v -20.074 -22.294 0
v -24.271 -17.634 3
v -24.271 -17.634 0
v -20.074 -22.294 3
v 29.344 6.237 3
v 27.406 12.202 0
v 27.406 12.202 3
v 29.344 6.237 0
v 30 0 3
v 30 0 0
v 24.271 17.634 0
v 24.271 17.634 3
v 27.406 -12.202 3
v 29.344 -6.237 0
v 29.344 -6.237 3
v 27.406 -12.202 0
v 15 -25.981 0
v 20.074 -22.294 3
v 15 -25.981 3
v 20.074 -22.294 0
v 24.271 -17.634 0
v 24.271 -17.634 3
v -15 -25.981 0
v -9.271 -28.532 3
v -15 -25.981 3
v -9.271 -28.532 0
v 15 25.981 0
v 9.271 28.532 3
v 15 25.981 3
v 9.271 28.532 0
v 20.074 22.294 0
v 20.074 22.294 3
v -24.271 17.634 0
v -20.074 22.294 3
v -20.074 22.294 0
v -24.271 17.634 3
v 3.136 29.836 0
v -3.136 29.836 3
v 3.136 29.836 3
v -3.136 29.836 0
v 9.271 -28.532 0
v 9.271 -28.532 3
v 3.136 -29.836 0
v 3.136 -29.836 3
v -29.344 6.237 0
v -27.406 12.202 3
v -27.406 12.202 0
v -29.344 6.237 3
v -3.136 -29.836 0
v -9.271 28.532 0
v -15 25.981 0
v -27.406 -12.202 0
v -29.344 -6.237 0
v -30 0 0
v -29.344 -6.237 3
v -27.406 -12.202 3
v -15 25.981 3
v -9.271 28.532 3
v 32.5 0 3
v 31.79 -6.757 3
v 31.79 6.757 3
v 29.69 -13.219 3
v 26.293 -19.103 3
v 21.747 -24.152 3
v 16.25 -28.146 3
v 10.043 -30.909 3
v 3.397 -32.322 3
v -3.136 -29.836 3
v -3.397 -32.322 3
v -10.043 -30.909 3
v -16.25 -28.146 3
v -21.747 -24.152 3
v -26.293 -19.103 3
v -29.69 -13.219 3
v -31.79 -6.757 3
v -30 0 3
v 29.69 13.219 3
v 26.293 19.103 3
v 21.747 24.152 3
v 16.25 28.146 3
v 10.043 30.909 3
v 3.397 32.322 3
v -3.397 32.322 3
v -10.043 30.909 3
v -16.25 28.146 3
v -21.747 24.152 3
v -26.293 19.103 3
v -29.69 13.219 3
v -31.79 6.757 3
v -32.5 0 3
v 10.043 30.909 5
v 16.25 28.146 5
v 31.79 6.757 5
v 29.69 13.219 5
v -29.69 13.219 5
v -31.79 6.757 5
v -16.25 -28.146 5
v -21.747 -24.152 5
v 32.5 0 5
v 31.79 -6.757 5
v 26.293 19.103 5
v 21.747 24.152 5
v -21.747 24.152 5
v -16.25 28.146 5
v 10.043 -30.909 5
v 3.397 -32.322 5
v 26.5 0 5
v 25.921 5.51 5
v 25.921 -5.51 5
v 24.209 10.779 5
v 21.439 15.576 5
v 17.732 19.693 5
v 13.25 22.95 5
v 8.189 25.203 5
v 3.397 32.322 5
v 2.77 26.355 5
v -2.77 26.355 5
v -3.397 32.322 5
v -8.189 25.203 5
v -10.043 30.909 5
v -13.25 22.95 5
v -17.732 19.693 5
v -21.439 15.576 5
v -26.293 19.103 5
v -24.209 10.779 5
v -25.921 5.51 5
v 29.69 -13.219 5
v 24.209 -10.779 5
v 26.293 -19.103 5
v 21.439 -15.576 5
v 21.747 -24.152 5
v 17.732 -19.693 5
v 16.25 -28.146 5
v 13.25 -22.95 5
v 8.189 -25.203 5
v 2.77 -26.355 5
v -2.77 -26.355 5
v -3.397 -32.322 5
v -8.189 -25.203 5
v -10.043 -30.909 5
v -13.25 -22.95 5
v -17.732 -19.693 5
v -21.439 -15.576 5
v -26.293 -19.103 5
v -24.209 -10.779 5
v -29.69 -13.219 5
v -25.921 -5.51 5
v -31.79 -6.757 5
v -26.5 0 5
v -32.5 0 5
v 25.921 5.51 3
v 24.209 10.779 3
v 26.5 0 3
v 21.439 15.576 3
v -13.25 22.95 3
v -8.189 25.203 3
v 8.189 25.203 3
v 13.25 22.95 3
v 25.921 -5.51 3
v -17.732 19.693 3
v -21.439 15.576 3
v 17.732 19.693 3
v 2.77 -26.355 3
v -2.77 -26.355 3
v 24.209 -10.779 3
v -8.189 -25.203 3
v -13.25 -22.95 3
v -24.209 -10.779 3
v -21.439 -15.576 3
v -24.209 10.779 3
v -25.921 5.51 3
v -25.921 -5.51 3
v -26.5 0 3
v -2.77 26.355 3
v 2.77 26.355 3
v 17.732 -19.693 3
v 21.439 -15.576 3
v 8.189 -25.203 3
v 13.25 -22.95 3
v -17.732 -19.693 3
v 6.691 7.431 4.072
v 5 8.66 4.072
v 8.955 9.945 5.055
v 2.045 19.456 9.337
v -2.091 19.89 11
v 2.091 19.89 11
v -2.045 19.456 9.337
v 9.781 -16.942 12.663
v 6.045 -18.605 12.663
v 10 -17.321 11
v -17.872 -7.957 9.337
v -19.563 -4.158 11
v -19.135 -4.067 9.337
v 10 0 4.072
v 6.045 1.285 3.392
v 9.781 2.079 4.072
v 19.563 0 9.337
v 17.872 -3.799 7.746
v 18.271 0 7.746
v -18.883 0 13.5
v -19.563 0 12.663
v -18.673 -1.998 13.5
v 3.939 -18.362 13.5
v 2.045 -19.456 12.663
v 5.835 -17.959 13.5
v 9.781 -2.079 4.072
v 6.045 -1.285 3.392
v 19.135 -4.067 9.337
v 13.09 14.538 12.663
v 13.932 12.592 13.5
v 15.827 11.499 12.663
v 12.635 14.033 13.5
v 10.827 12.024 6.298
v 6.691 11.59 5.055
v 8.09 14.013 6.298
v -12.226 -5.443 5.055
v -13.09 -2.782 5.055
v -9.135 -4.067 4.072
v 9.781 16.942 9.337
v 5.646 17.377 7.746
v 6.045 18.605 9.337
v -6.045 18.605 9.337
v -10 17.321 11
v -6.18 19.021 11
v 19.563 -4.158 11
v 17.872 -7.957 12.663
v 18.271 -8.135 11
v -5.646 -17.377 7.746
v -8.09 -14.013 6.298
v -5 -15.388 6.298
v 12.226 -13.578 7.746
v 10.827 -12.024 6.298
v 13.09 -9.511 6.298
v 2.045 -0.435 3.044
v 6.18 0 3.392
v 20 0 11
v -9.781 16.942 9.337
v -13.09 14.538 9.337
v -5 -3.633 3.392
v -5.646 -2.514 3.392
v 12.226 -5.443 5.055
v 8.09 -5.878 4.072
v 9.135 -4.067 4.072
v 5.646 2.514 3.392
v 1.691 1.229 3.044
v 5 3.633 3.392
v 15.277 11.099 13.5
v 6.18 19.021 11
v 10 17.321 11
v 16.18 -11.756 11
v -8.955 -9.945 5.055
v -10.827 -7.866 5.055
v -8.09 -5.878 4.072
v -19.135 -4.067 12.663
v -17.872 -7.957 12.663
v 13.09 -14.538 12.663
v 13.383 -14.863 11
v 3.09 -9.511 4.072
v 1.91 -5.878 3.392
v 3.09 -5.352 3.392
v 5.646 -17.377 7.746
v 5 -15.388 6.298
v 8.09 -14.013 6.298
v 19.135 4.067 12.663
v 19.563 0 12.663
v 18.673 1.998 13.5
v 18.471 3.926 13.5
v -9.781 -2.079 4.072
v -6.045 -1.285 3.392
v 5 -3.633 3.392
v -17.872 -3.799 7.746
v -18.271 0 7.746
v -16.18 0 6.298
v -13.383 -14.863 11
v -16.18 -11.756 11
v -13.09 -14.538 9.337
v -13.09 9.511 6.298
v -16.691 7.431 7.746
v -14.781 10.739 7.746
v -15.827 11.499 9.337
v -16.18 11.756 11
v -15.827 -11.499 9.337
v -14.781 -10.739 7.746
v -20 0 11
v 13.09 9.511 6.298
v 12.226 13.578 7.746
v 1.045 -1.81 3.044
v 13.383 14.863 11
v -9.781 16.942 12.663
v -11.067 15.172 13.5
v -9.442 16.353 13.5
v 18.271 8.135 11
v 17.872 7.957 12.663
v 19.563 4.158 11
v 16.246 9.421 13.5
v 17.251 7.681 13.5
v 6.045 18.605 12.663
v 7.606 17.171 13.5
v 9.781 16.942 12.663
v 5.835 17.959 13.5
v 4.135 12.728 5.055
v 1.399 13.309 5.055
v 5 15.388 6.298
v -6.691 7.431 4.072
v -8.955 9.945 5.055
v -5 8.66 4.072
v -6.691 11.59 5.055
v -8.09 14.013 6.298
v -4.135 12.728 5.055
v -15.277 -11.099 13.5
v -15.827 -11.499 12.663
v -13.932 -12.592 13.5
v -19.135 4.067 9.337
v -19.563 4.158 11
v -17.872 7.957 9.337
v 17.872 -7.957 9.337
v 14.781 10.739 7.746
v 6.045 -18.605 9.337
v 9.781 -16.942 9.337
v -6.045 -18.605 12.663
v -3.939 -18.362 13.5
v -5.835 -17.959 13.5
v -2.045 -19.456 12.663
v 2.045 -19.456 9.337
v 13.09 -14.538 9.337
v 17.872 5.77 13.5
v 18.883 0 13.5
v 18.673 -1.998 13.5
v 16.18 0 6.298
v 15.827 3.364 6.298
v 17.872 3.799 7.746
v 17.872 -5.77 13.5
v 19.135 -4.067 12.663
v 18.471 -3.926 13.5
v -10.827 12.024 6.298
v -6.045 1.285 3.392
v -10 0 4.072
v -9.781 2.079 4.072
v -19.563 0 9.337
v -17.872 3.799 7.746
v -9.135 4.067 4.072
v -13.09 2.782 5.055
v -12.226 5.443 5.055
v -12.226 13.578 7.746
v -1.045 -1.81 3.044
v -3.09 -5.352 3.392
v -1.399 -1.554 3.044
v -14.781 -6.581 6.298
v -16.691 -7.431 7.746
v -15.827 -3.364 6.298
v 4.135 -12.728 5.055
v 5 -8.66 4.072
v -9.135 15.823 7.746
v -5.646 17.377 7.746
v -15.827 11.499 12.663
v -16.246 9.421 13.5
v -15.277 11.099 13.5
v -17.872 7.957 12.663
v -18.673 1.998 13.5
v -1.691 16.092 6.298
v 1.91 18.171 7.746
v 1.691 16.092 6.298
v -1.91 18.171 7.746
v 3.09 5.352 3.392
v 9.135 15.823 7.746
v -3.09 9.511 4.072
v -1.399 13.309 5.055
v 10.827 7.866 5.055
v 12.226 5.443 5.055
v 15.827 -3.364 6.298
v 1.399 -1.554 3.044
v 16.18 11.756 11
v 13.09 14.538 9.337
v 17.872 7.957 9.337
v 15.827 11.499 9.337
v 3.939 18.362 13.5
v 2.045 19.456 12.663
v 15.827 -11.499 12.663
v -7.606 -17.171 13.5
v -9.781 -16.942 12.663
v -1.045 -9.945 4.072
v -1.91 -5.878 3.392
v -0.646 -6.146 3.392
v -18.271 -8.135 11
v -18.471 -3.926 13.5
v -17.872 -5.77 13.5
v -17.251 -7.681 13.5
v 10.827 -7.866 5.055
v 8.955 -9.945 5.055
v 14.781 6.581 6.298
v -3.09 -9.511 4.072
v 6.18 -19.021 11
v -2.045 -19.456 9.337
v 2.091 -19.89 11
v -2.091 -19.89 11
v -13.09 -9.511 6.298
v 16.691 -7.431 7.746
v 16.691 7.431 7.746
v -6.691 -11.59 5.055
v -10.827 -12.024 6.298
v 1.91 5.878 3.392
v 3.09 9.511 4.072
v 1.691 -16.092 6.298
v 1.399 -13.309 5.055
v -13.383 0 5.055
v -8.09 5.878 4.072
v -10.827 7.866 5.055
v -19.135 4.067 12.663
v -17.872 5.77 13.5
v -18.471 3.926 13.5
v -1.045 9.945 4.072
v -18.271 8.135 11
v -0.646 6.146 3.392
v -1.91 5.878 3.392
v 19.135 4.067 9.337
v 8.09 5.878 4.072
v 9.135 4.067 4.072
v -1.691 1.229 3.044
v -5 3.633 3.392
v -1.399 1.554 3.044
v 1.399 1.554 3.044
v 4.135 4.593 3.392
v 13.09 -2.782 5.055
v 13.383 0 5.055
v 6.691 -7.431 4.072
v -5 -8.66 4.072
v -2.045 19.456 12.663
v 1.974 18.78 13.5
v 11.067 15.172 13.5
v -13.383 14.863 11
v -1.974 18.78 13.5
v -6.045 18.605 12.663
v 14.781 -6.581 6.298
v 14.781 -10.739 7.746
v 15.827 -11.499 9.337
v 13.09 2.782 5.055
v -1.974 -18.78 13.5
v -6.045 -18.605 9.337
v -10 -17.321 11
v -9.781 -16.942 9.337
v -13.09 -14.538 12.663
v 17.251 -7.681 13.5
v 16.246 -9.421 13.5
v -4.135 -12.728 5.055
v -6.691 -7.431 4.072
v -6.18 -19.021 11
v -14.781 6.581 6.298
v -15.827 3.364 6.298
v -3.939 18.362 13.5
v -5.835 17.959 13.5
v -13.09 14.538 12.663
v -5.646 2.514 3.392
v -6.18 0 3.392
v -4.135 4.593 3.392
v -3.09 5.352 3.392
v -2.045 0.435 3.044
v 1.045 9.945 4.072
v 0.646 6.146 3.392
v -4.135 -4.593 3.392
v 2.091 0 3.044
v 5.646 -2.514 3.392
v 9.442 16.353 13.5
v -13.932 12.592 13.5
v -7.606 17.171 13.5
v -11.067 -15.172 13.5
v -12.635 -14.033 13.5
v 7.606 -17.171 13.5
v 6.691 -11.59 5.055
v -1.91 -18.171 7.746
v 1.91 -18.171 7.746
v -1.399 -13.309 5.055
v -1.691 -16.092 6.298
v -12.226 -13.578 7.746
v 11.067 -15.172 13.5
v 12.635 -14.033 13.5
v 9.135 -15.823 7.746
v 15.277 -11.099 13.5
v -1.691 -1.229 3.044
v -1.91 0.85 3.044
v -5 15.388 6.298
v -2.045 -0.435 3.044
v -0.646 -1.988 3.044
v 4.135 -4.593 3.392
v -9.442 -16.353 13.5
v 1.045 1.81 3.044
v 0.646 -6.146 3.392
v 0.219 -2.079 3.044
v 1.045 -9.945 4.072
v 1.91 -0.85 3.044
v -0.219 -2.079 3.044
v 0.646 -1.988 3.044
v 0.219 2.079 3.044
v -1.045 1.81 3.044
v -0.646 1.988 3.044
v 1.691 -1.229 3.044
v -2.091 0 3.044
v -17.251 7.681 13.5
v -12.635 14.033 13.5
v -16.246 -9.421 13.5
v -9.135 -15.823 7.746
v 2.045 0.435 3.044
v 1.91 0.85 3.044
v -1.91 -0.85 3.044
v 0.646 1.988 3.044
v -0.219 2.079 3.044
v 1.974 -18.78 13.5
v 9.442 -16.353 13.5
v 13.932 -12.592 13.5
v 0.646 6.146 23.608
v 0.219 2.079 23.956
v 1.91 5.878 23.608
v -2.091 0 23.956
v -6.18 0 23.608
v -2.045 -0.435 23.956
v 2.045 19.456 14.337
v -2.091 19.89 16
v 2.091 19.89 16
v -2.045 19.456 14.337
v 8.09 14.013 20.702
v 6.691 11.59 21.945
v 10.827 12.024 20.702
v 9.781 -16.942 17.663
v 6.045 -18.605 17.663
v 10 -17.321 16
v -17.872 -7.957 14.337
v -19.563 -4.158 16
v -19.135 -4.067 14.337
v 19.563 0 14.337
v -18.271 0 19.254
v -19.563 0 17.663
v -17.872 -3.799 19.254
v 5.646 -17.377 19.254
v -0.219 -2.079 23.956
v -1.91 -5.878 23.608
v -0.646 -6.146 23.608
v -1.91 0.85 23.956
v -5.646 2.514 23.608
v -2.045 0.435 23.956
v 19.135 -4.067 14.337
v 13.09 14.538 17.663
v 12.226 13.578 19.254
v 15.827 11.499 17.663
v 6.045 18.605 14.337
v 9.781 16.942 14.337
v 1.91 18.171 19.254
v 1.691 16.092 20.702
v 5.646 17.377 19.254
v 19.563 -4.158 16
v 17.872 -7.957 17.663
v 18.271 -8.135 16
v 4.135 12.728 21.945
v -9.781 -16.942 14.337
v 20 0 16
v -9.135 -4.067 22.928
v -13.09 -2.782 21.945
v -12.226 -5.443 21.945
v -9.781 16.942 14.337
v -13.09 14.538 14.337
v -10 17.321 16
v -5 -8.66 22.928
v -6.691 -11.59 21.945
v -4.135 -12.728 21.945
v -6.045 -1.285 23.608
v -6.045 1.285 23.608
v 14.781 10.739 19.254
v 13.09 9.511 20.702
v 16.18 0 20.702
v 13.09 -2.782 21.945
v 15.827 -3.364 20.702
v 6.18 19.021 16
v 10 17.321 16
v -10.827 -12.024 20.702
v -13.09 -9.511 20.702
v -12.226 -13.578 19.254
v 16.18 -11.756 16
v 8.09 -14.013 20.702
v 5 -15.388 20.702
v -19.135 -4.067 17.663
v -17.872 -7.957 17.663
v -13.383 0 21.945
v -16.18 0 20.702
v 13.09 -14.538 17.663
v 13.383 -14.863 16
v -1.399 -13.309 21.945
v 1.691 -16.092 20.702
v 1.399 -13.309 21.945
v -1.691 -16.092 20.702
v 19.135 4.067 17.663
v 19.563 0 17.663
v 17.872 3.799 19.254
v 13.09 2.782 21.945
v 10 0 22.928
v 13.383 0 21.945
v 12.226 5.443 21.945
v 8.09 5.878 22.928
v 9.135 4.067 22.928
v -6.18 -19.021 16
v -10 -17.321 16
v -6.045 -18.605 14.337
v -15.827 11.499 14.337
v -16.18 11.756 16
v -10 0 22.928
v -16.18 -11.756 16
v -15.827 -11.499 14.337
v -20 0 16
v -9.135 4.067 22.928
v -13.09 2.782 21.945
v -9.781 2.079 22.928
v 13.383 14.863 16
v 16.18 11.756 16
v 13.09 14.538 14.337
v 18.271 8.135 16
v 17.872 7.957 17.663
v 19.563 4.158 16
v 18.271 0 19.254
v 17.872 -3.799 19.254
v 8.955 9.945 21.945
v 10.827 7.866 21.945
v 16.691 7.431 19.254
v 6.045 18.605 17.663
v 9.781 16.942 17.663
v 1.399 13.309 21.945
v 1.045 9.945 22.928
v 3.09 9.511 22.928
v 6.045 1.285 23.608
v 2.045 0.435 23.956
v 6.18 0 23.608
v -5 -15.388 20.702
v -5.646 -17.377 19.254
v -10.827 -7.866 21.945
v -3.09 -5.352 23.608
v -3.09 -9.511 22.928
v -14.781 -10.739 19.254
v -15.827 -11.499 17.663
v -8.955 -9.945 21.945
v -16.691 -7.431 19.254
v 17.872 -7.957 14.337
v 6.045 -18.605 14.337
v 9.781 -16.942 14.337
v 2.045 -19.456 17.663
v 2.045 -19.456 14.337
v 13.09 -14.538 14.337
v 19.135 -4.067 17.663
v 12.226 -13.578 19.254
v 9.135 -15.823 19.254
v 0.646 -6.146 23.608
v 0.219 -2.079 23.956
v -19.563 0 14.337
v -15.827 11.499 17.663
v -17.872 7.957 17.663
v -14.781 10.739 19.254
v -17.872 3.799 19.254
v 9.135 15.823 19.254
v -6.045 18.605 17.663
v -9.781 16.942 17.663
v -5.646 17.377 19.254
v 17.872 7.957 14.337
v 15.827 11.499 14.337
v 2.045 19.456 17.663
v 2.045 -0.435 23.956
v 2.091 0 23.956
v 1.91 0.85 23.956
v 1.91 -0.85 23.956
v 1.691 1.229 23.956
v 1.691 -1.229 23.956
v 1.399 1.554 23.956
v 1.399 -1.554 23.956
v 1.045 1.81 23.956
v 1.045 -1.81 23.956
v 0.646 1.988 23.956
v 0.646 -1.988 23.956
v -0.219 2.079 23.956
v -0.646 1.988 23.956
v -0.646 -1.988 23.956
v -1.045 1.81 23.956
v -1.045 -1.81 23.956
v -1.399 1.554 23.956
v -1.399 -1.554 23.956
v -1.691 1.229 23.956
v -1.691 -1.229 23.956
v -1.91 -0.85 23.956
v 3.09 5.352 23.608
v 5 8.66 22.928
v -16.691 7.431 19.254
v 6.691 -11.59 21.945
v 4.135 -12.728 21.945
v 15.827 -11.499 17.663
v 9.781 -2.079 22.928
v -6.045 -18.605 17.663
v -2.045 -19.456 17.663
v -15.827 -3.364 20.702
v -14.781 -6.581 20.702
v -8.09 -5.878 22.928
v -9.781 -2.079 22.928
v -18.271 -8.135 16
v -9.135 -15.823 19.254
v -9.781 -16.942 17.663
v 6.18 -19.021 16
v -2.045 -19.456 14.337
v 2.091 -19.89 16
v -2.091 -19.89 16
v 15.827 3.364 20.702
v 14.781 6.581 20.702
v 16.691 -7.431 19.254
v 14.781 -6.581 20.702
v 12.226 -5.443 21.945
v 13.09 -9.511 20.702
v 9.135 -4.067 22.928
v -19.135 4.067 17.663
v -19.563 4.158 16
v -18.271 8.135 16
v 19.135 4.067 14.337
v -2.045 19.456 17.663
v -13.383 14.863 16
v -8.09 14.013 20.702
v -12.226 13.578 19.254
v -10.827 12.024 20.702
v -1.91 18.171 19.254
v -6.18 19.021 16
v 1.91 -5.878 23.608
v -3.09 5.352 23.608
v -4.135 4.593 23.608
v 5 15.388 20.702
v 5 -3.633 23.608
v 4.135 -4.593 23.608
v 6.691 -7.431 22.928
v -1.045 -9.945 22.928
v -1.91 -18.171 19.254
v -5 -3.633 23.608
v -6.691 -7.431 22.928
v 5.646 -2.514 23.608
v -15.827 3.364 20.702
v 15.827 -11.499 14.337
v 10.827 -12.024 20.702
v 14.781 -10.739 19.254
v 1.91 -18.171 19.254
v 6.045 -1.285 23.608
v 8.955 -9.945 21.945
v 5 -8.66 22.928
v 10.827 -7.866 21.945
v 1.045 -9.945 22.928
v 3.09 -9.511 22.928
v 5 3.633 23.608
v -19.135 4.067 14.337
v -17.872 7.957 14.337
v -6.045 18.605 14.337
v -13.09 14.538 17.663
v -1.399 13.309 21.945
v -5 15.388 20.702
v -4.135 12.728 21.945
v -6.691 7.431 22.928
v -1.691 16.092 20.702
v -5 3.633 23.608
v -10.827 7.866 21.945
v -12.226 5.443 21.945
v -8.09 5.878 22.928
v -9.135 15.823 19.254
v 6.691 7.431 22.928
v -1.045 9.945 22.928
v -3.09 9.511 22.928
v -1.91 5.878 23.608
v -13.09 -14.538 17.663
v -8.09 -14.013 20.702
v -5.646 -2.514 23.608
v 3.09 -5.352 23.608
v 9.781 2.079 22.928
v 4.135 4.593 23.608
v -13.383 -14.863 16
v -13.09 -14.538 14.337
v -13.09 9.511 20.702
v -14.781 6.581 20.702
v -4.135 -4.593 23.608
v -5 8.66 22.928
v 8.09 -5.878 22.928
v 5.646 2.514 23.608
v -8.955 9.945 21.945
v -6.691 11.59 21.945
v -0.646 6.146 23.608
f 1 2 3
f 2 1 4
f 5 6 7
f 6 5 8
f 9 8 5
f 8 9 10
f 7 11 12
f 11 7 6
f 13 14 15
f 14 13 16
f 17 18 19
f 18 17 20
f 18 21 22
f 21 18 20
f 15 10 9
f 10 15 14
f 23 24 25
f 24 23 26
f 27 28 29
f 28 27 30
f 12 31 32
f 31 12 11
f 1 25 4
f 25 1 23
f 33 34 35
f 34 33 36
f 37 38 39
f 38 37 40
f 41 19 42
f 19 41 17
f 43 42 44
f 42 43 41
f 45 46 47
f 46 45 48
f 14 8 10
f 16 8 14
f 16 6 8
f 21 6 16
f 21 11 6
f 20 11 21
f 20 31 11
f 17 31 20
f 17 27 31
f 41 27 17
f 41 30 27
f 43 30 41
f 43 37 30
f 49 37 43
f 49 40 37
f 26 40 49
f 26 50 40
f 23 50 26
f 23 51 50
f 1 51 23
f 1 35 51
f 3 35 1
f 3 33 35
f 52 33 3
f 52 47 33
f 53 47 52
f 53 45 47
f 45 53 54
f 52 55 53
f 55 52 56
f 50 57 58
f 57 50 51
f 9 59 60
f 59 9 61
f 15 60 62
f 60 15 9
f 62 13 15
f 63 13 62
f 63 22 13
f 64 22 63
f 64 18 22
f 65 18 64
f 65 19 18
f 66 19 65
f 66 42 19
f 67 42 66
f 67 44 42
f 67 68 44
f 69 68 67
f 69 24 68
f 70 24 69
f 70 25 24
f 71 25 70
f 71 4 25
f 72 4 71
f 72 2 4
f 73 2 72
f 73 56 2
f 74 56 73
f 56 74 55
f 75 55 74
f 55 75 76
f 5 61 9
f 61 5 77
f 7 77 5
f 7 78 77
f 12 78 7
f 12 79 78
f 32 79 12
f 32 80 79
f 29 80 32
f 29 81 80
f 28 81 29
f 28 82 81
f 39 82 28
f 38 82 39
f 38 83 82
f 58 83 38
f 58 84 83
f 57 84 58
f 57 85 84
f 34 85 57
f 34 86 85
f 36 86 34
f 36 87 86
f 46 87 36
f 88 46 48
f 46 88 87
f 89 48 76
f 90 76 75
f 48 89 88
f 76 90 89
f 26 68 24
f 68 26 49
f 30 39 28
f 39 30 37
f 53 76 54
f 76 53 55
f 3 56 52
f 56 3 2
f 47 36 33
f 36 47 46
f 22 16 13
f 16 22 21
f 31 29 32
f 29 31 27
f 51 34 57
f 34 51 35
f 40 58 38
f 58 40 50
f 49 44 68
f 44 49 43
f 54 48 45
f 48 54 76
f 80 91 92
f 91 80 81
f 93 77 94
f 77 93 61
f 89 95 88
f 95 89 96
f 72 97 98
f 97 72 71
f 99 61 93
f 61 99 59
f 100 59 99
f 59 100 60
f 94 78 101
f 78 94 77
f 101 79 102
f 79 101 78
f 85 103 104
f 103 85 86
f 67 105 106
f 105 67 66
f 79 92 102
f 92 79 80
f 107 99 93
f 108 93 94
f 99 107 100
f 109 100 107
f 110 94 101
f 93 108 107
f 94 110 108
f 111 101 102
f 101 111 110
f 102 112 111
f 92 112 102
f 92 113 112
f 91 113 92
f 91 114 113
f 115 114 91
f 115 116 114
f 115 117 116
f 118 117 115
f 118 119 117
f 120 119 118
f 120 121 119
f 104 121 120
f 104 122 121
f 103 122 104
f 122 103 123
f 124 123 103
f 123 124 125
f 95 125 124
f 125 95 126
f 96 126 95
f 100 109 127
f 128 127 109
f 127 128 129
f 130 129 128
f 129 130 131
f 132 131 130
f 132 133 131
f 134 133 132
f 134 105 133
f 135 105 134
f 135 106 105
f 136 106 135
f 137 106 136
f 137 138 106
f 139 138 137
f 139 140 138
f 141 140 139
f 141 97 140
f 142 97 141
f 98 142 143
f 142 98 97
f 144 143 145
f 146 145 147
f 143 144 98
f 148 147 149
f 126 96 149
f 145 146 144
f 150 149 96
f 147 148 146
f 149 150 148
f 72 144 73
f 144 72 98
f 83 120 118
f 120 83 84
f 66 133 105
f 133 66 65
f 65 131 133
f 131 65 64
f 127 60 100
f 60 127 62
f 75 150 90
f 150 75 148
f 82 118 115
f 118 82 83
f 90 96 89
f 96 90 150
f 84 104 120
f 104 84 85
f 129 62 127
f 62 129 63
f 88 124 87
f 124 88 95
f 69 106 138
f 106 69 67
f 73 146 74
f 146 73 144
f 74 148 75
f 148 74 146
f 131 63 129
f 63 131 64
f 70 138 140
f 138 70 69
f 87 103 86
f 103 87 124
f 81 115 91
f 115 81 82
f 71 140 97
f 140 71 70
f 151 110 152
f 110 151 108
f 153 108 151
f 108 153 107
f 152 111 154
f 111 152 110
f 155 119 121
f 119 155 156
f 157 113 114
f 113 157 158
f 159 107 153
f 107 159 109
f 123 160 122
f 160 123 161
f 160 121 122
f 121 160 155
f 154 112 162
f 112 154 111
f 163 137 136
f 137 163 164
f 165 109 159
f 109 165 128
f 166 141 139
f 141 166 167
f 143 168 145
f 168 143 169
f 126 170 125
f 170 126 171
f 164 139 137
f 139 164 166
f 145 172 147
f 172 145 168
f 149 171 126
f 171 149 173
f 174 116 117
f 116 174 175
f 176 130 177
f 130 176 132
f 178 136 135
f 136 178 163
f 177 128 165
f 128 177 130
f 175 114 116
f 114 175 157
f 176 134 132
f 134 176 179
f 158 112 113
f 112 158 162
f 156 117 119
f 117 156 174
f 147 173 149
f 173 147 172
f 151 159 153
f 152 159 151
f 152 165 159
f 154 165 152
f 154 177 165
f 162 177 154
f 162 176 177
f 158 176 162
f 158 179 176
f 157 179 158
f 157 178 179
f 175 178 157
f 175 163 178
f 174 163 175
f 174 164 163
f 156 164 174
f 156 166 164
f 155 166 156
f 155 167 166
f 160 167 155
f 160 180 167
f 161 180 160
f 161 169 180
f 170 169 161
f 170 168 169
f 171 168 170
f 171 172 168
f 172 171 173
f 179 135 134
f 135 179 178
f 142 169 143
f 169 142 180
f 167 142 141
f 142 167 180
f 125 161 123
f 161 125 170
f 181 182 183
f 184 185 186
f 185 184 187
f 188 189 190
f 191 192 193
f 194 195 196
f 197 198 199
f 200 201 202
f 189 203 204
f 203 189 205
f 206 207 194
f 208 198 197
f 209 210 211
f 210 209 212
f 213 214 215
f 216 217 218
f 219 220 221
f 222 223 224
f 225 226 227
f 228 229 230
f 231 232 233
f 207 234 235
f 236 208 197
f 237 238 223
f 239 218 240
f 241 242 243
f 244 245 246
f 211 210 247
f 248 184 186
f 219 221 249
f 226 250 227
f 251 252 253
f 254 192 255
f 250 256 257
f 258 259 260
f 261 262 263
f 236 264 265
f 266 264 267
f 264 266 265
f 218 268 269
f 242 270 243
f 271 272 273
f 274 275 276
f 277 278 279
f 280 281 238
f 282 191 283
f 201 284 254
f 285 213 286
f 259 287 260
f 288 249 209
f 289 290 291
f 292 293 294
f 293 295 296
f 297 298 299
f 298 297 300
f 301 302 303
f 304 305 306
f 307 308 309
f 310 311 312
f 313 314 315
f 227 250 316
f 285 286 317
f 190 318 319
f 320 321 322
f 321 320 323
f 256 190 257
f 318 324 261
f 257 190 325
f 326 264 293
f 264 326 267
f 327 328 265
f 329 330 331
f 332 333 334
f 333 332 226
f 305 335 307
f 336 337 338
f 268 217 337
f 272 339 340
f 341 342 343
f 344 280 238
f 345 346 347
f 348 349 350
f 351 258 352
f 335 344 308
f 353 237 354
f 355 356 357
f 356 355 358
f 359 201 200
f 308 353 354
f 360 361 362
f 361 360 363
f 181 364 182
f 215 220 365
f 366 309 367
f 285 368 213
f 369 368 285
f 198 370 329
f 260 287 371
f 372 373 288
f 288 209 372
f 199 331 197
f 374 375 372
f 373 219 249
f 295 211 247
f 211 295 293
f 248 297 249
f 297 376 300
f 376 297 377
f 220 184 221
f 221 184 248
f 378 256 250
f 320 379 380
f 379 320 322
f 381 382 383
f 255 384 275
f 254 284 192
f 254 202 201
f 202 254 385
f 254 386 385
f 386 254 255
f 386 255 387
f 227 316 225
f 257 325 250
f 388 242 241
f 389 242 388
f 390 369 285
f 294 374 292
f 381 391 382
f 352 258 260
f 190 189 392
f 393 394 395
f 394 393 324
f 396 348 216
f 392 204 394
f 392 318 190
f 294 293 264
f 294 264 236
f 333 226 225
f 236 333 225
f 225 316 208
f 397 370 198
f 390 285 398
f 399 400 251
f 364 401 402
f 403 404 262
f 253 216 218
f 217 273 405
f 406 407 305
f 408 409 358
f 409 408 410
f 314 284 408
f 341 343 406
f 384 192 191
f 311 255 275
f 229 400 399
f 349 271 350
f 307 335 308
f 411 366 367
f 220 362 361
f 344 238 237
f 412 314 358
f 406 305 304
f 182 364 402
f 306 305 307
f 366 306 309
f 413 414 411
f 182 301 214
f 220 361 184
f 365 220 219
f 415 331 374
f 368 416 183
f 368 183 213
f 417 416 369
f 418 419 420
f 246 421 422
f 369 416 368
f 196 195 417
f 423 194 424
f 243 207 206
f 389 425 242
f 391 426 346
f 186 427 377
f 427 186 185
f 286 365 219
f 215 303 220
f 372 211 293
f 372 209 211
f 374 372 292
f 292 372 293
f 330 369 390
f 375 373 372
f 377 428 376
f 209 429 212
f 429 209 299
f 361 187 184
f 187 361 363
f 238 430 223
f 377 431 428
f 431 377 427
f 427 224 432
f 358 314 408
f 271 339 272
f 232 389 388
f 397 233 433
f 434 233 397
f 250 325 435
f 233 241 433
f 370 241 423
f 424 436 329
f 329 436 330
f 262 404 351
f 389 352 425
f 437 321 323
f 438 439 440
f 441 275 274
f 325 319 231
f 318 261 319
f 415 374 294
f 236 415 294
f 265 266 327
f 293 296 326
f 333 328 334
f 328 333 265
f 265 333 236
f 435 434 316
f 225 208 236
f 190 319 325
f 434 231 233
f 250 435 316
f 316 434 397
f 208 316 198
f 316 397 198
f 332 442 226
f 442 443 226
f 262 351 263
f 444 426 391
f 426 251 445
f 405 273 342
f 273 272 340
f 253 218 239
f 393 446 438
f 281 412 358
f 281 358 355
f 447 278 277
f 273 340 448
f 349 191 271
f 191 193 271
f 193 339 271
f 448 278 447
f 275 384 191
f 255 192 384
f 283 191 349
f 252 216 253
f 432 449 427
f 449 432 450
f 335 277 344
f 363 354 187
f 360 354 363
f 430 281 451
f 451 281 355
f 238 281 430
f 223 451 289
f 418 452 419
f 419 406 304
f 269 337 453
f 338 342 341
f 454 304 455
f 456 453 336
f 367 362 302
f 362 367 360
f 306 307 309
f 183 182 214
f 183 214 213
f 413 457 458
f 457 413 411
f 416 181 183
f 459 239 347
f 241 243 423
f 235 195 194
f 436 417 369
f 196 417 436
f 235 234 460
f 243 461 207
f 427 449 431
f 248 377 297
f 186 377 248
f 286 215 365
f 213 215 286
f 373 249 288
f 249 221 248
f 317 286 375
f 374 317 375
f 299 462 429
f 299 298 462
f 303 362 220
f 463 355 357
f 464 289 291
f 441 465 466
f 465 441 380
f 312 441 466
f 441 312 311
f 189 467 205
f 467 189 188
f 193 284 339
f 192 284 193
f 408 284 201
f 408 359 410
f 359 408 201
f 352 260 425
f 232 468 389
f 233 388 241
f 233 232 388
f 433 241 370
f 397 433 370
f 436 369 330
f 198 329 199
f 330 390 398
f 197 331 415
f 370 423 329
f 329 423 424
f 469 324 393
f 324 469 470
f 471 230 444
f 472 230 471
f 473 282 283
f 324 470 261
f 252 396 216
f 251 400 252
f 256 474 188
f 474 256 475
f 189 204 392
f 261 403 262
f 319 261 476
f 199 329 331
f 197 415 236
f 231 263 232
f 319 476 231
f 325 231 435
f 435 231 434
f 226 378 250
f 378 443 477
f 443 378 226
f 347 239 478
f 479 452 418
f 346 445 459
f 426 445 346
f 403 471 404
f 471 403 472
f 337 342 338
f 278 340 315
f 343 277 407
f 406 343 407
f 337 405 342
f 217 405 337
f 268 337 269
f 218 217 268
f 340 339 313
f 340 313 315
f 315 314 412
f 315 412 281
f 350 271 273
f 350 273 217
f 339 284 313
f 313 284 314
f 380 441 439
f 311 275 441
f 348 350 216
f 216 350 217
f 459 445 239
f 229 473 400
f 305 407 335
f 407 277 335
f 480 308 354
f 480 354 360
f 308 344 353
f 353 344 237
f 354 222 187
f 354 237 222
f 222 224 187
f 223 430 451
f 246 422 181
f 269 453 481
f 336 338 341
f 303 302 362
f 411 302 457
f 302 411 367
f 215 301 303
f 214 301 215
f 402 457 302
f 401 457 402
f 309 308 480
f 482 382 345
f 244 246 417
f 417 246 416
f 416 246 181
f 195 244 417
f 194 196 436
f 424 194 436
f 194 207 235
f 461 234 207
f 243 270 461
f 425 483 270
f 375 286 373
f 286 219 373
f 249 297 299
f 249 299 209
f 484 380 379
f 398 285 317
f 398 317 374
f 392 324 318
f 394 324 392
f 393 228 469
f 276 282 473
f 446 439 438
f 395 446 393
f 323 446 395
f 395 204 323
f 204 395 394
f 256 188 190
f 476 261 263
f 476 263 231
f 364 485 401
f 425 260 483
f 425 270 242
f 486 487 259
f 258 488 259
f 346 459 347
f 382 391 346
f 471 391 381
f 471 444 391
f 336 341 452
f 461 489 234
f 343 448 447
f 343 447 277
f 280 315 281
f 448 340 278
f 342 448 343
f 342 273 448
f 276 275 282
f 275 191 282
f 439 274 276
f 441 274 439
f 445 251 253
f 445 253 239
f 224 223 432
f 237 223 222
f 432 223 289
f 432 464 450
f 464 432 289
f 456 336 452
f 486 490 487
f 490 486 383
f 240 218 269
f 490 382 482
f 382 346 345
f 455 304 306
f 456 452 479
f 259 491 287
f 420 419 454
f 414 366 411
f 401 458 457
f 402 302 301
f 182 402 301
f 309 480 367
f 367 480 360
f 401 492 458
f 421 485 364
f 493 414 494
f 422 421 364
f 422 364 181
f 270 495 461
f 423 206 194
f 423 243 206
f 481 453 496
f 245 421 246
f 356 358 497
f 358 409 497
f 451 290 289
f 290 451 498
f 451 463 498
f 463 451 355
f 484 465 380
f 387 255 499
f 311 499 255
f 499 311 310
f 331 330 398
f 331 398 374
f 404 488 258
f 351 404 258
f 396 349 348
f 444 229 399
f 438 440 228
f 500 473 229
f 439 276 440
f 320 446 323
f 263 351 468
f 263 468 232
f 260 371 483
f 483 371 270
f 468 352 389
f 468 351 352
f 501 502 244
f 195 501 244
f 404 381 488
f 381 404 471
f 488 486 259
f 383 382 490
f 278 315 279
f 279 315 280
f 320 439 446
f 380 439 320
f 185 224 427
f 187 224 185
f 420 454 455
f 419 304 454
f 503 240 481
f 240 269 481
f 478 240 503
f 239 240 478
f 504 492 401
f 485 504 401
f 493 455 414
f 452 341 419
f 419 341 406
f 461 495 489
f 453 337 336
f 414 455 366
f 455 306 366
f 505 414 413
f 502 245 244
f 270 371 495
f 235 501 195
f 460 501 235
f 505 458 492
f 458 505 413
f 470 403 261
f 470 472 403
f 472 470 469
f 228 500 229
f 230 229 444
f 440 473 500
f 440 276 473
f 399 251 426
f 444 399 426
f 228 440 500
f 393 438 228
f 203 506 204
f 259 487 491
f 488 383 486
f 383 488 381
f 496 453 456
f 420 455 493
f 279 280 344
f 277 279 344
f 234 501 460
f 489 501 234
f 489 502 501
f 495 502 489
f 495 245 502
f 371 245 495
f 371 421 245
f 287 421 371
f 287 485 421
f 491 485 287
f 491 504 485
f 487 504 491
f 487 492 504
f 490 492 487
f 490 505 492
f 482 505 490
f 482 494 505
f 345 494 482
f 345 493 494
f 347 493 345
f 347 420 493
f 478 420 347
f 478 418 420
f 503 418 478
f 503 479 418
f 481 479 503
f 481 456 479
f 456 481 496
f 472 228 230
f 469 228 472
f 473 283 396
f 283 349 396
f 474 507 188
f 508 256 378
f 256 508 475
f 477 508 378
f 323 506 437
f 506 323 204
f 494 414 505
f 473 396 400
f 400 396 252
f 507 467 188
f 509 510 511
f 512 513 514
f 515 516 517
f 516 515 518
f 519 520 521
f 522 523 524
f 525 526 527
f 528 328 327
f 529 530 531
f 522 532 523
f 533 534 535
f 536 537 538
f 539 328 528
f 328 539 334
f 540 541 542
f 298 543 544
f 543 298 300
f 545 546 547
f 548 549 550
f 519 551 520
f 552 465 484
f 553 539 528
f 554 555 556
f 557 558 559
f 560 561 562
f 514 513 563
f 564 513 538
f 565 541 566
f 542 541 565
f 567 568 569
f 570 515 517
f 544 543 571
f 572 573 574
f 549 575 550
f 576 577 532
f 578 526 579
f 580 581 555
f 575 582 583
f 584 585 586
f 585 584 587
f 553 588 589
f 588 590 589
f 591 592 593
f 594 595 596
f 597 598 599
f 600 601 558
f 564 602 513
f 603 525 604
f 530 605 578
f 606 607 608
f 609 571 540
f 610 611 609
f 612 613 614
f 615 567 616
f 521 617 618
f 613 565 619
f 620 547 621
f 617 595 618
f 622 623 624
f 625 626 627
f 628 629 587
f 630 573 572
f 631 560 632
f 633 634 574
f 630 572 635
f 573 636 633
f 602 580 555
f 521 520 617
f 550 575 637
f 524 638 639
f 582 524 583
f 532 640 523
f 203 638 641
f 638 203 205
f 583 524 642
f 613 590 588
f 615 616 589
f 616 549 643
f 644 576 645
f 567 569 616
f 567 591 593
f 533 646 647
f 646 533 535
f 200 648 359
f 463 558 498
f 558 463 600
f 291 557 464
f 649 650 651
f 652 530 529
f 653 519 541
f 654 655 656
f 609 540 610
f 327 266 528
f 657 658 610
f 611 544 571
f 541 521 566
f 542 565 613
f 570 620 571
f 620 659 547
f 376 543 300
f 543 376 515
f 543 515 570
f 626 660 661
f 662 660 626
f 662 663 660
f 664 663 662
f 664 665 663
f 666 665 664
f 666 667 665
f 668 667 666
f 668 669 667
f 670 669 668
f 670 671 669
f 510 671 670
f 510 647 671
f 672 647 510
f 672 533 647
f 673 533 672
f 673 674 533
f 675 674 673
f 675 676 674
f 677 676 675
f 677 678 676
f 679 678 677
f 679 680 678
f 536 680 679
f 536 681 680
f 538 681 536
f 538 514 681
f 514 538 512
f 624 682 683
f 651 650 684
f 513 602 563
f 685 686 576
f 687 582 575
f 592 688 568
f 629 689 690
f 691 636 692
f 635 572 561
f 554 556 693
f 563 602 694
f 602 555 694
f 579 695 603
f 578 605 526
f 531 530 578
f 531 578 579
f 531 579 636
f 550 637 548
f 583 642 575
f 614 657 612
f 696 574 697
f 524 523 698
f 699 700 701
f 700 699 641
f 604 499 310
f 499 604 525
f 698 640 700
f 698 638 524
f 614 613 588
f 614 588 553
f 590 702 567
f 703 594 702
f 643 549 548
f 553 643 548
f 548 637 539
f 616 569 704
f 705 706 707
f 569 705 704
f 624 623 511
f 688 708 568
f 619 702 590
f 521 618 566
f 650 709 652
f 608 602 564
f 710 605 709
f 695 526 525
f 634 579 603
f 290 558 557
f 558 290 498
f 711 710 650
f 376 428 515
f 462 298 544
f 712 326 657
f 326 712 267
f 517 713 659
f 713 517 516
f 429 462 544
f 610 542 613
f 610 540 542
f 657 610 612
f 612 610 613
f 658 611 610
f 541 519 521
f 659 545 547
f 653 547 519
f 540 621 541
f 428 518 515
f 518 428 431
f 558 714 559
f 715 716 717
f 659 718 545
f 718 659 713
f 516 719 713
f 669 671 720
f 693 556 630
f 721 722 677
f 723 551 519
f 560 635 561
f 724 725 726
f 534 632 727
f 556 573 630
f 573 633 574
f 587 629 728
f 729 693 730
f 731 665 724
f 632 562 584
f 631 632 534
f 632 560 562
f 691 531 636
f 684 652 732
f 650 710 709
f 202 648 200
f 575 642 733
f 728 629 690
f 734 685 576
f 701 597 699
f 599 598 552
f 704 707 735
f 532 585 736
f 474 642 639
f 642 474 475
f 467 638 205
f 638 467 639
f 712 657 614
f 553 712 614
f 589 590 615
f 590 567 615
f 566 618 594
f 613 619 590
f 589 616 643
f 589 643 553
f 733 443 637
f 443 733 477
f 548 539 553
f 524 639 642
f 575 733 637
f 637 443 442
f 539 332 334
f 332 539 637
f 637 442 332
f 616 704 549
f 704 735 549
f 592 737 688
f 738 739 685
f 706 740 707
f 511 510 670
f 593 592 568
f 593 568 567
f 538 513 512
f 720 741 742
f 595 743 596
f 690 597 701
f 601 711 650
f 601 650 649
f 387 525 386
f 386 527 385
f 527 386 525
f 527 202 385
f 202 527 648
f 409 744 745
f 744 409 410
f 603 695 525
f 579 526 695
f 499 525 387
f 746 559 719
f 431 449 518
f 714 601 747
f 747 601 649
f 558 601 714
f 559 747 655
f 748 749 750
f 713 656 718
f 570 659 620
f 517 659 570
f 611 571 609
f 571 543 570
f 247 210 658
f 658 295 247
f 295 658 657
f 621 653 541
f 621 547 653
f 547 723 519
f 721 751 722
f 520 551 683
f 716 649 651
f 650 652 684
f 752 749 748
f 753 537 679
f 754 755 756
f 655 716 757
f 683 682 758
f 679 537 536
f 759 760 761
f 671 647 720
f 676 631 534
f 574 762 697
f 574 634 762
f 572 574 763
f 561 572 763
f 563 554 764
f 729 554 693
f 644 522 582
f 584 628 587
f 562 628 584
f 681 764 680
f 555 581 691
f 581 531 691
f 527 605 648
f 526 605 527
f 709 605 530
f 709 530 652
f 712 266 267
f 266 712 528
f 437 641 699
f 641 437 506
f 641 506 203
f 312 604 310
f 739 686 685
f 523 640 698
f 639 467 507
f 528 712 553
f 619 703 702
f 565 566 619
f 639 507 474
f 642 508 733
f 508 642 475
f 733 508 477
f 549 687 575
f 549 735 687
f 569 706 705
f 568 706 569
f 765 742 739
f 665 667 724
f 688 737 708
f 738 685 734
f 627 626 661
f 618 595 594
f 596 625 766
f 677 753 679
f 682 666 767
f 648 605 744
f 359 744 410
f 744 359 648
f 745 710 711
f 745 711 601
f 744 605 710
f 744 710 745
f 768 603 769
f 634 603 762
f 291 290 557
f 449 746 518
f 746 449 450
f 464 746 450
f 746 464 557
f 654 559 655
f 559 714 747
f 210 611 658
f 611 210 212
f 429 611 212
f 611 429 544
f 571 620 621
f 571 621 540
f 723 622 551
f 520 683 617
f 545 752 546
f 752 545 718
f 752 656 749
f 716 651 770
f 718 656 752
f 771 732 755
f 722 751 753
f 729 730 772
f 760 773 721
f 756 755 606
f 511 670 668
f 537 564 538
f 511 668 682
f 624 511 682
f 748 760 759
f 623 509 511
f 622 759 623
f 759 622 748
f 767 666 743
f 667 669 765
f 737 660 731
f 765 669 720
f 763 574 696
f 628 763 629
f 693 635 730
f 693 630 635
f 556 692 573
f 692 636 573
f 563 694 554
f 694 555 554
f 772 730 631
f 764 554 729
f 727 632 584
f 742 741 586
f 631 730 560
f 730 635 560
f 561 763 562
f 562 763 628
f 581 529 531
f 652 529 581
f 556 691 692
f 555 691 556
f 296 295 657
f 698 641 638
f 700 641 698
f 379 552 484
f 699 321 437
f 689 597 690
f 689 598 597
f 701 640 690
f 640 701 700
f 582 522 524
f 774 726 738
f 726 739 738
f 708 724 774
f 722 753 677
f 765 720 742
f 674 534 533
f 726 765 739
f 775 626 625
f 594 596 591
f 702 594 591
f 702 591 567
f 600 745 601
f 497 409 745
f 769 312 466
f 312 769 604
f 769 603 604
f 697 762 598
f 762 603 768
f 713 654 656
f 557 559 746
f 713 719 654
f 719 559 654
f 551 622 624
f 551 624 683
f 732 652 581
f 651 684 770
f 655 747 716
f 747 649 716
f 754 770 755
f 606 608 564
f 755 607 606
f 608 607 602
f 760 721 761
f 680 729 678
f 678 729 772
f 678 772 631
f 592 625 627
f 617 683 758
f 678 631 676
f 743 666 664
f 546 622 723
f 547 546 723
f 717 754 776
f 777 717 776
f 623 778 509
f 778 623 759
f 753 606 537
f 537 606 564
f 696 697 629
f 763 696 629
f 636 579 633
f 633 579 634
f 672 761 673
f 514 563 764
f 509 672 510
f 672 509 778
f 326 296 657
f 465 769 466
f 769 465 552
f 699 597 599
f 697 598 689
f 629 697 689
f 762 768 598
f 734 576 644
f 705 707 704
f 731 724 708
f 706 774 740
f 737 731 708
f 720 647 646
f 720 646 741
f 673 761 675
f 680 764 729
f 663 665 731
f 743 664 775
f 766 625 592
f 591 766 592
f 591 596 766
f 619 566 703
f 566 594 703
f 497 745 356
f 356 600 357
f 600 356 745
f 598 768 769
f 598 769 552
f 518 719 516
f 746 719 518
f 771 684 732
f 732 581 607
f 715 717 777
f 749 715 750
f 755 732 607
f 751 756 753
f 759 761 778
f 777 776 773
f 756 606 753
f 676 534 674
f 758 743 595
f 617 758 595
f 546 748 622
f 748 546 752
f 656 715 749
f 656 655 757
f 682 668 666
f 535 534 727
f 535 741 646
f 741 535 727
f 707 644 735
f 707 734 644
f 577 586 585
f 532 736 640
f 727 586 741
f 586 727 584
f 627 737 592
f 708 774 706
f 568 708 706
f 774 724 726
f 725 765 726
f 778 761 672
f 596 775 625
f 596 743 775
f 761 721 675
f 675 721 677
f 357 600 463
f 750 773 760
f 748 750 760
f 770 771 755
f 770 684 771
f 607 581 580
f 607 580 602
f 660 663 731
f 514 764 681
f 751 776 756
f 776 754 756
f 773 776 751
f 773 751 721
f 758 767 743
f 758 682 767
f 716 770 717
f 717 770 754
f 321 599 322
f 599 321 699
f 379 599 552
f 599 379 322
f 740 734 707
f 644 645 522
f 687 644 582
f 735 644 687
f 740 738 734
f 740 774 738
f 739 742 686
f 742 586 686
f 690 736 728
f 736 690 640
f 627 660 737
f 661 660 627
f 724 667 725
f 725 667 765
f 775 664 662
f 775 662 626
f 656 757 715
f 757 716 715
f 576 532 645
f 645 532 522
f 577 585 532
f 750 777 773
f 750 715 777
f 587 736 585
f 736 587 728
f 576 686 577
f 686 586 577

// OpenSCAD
module plate() {
    color("wheat") 
    difference() {
        union() {
            cylinder(h=3, d=60); 
            hull() { 
                translate([0, 0, 3]) cylinder(h=2, d=65); 
                translate([0, 0, 3]) cylinder(h=1, d=55); 
            }
        }
        translate([0, 0, 3])
            cylinder(h=2, d=53); 
    }
}


module dorayaki_top() {
    color("sandybrown") 
    scale([1,1,0.4]) sphere(20); 
}


module dorayaki_bottom() {
    color("sandybrown") 
    translate([0,0,-5]) 
    scale([1,1,0.4]) sphere(20);
}


module dorayaki_filling() {
    color("brown") // 
    translate([0, 0, -2])
    cylinder(h=4, d=32); 
}


module dorayaki() {
    dorayaki_bottom();
    dorayaki_filling();
    dorayaki_top();
}


plate();
translate([0, 0, 16]) dorayaki();
